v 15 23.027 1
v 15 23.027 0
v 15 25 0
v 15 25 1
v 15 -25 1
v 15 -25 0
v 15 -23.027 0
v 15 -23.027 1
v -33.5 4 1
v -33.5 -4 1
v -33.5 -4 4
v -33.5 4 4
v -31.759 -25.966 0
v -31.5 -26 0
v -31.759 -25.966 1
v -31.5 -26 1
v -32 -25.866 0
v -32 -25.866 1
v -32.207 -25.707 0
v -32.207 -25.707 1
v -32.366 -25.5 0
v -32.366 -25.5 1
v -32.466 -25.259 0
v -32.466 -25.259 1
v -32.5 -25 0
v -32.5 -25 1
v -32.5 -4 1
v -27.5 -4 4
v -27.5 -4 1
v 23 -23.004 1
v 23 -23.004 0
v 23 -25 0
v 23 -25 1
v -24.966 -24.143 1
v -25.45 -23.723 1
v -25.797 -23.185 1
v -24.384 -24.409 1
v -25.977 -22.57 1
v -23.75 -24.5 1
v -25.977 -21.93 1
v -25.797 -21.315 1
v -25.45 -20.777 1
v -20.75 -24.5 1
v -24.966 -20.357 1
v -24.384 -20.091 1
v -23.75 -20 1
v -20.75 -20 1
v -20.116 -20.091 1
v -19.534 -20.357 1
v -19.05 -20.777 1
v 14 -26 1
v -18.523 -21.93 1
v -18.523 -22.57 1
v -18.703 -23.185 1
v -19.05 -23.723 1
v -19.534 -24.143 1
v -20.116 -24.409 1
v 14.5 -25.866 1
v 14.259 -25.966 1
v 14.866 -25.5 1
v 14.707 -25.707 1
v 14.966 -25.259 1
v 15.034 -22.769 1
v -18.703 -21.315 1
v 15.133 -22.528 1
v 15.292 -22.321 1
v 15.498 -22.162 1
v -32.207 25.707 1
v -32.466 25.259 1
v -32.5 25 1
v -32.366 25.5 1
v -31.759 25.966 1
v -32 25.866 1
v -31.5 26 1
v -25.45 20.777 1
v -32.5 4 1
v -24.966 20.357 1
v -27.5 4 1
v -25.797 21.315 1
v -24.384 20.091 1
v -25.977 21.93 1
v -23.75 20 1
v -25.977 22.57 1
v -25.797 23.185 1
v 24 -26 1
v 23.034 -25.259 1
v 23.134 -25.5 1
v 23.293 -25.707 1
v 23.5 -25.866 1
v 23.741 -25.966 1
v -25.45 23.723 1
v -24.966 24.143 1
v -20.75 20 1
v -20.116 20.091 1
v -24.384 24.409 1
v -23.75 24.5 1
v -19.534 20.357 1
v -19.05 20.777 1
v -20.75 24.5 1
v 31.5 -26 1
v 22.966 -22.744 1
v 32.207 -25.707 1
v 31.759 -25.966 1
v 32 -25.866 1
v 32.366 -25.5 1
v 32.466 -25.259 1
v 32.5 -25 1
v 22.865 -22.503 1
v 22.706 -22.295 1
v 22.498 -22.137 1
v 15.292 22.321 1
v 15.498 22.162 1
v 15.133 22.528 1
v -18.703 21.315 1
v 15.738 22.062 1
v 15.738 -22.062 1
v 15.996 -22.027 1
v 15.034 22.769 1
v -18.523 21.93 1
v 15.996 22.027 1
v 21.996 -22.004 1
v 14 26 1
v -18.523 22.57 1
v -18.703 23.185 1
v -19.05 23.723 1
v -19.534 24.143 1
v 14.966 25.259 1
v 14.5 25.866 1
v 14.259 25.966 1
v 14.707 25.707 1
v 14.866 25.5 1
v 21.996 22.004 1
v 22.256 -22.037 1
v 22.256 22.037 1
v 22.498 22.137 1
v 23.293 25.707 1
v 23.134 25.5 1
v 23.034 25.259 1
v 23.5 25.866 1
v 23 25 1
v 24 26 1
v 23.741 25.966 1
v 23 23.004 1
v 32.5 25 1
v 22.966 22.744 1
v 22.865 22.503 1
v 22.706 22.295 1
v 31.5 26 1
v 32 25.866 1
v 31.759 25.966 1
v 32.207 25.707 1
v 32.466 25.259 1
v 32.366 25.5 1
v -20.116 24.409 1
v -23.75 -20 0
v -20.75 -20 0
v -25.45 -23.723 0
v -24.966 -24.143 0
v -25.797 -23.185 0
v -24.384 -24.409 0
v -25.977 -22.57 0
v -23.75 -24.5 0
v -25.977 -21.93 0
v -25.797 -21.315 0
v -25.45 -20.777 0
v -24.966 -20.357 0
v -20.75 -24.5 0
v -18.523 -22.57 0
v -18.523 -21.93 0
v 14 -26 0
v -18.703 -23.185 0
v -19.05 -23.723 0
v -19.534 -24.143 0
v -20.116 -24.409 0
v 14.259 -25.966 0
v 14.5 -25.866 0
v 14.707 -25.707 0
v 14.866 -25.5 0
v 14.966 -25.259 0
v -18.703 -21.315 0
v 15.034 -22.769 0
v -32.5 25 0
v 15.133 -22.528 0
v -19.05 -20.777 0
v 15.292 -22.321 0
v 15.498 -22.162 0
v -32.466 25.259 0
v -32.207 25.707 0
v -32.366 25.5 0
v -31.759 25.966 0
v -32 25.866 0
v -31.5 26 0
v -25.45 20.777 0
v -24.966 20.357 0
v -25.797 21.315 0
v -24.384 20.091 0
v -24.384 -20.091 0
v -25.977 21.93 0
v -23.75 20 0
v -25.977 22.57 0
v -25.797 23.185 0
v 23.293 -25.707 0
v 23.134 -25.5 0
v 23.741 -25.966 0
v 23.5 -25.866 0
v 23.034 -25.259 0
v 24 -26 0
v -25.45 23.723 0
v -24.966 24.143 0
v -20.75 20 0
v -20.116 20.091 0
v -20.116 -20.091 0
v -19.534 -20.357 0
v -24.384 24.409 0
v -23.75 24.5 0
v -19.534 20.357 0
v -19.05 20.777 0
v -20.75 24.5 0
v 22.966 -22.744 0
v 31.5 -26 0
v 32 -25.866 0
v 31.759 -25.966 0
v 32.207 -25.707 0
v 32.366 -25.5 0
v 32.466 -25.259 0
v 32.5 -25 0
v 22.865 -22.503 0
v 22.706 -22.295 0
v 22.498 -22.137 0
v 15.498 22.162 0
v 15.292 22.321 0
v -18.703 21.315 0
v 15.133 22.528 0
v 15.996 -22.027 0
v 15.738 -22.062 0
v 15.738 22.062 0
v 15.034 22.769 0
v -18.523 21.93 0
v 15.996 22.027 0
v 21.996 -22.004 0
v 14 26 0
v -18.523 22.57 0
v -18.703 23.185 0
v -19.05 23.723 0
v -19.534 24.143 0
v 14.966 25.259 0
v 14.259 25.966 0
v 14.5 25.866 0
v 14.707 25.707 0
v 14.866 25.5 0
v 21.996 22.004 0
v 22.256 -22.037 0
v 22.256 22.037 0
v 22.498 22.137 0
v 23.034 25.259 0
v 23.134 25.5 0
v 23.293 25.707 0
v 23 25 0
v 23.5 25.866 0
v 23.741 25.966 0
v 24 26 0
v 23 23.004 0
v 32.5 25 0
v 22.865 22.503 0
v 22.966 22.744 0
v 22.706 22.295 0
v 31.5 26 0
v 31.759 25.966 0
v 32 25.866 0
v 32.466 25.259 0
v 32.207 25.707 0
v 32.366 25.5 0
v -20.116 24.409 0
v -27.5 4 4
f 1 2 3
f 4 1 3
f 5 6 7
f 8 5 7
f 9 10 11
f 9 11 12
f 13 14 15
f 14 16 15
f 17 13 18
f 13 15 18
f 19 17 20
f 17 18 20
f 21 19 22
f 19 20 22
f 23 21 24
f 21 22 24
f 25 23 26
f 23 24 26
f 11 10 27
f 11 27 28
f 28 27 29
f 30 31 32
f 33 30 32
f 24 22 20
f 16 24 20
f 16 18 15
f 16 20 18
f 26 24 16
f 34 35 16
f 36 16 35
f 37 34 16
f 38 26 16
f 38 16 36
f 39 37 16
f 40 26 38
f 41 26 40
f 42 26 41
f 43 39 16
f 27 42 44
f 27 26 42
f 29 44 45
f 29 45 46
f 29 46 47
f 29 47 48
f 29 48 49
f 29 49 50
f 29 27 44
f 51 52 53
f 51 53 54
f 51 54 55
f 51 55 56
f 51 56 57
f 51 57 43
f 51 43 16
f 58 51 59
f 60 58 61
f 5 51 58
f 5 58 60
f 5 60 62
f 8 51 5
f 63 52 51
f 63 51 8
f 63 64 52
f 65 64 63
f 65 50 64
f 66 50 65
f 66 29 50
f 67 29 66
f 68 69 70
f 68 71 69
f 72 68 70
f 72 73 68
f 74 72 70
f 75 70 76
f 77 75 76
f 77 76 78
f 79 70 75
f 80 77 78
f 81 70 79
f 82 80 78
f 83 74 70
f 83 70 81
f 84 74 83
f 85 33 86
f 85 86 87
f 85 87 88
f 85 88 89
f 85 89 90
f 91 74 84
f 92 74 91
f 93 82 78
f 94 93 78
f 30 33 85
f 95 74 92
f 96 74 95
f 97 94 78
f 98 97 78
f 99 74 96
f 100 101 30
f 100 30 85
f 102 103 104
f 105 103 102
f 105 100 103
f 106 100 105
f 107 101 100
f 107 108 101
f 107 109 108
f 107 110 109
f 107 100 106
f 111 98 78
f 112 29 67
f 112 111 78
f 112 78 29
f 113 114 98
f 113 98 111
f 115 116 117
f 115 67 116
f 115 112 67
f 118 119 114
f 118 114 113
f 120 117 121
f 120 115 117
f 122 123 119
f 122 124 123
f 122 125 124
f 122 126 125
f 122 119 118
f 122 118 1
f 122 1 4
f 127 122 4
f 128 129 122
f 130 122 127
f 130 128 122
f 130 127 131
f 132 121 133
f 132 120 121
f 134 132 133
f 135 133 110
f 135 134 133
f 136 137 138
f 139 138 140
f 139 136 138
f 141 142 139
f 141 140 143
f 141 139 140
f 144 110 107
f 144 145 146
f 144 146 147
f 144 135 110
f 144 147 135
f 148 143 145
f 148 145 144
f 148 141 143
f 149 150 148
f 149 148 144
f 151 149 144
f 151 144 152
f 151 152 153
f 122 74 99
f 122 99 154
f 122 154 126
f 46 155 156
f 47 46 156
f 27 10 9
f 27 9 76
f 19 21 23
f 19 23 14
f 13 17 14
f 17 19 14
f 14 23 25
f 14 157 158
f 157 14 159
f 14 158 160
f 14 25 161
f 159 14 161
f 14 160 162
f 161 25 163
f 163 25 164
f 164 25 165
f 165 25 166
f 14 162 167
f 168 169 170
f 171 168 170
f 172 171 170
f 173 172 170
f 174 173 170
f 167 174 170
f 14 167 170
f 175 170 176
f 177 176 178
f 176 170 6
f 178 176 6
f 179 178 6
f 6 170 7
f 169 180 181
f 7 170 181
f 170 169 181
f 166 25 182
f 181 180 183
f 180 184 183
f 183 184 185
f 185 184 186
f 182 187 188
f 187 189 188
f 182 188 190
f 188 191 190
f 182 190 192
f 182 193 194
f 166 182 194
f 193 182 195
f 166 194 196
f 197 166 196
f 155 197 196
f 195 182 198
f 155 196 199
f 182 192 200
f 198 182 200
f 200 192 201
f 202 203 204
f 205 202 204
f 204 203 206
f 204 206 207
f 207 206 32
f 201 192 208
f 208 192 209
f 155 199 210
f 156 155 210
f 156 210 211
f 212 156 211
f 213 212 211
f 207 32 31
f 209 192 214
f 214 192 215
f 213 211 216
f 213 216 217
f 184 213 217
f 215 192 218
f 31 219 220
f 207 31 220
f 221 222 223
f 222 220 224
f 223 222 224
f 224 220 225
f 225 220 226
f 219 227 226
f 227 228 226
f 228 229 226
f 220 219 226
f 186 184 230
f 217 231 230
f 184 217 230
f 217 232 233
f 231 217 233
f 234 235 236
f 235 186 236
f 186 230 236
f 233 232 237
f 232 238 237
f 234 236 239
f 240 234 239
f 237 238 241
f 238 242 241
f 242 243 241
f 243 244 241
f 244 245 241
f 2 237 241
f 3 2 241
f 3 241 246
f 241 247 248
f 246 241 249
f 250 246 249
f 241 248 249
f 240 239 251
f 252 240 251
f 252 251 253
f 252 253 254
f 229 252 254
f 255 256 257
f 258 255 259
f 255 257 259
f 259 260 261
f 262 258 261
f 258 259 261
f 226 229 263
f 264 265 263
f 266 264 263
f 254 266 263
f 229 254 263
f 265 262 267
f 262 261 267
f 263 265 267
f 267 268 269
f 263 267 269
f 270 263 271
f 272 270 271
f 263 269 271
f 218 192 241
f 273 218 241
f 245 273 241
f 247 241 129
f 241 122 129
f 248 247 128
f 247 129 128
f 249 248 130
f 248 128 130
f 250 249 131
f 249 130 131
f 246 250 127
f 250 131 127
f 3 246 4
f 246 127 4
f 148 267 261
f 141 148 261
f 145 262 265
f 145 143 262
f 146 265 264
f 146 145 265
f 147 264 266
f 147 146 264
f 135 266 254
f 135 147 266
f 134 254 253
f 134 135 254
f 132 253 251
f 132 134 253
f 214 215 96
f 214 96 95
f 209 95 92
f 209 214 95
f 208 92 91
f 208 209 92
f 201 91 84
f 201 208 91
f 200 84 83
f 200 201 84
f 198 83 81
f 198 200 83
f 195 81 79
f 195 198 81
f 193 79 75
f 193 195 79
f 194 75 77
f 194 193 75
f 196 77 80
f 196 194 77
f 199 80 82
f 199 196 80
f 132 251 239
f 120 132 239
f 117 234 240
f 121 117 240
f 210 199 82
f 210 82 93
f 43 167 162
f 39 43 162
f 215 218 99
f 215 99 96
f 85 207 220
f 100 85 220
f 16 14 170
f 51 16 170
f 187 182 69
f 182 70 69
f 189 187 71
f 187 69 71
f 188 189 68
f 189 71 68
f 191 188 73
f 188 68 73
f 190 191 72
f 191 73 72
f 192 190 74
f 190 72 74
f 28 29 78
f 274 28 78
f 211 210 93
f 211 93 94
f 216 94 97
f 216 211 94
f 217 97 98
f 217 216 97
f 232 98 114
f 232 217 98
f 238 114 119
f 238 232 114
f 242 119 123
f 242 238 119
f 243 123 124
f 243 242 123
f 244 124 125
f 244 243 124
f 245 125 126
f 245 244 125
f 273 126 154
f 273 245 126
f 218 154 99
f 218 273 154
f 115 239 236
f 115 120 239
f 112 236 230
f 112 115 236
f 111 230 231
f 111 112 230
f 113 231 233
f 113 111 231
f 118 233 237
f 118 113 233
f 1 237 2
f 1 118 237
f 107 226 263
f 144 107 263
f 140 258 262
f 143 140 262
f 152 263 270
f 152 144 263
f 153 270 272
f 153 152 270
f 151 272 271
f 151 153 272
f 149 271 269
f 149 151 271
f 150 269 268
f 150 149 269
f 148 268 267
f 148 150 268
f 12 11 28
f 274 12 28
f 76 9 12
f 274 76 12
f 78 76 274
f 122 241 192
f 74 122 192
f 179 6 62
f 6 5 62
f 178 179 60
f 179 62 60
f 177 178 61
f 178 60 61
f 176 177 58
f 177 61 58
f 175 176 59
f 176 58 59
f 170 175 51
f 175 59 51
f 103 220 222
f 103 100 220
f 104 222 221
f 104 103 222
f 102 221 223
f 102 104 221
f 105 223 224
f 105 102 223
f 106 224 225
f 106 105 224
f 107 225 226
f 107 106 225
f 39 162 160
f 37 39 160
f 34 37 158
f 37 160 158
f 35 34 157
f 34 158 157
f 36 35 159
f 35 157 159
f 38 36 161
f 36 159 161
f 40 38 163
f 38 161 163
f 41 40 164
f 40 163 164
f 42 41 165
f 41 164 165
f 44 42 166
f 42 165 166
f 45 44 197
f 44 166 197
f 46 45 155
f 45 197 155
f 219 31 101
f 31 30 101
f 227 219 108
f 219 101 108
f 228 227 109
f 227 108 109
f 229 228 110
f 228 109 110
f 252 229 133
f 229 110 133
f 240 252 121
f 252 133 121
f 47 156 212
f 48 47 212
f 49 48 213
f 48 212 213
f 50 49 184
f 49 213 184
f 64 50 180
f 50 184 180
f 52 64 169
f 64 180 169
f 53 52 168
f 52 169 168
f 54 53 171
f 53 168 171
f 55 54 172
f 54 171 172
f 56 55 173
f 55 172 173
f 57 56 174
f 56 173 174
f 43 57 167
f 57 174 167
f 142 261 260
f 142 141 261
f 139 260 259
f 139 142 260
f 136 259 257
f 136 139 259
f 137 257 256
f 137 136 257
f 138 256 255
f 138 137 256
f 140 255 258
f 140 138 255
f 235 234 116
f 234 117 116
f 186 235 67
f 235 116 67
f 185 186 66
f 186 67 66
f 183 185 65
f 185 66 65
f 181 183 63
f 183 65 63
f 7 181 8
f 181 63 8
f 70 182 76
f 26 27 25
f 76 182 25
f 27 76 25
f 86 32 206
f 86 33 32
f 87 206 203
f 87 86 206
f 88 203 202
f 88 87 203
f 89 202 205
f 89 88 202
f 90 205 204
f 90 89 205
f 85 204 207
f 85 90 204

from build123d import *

# Parameters (mm, degrees)
EXTRUDE_1_DEPTH = 1
FILLET_1_R      = 1
SKETCH_2_W      = 6
SKETCH_2_H      = 8
EXTRUDE_2_DEPTH = 3


with BuildPart() as part:
    # Эскиз1 → Бобышка-Вытянуть1 (new body)
    with BuildSketch(Plane.XY):
        Polygon((23, -22), (23, -26), (32.5, -26), (32.5, 26), (23, 26), (23, 22), (15, 22.030768978), (15, 26), (-32.5, 26), (-32.5, -26), (15, -26), (15, -22.030768978), align=None)
        with BuildLine():
            ThreePointArc((-20.75, 20), (-18.5, 22.25), (-20.75, 24.5))
            Line((-20.75, 24.5), (-23.75, 24.5))
            ThreePointArc((-23.75, 24.5), (-26, 22.25), (-23.75, 20))
            Line((-23.75, 20), (-20.75, 20))
        make_face(mode=Mode.SUBTRACT)
        with BuildLine():
            Line((-23.75, -20), (-20.75, -20))
            ThreePointArc((-20.75, -20), (-18.5, -22.25), (-20.75, -24.5))
            Line((-20.75, -24.5), (-23.75, -24.5))
            ThreePointArc((-23.75, -24.5), (-26, -22.25), (-23.75, -20))
        make_face(mode=Mode.SUBTRACT)
    extrude(amount=EXTRUDE_1_DEPTH)

    # Скругление1
    fillet_1_edges = [part.edges().sort_by_distance(p)[0] for p in [
        (23, -22, 0.5),
        (15, -22.030768978, 0.5),
        (15, -26, 0.5),
        (-32.5, -26, 0.5),
        (-32.5, 26, 0.5),
        (15, 26, 0.5),
        (15, 22.030768978, 0.5),
        (23, 22, 0.5),
        (23, 26, 0.5),
        (32.5, 26, 0.5),
        (32.5, -26, 0.5),
        (23, -26, 0.5),
    ]]
    fillet(fillet_1_edges, radius=FILLET_1_R)

    # Эскиз2 → Бобышка-Вытянуть2 (add)
    with BuildSketch(Plane.XY.offset(1)):
        with Locations((-30.5, 0)):
            Rectangle(SKETCH_2_W, SKETCH_2_H)
    extrude(amount=EXTRUDE_2_DEPTH)


solid = part.part
